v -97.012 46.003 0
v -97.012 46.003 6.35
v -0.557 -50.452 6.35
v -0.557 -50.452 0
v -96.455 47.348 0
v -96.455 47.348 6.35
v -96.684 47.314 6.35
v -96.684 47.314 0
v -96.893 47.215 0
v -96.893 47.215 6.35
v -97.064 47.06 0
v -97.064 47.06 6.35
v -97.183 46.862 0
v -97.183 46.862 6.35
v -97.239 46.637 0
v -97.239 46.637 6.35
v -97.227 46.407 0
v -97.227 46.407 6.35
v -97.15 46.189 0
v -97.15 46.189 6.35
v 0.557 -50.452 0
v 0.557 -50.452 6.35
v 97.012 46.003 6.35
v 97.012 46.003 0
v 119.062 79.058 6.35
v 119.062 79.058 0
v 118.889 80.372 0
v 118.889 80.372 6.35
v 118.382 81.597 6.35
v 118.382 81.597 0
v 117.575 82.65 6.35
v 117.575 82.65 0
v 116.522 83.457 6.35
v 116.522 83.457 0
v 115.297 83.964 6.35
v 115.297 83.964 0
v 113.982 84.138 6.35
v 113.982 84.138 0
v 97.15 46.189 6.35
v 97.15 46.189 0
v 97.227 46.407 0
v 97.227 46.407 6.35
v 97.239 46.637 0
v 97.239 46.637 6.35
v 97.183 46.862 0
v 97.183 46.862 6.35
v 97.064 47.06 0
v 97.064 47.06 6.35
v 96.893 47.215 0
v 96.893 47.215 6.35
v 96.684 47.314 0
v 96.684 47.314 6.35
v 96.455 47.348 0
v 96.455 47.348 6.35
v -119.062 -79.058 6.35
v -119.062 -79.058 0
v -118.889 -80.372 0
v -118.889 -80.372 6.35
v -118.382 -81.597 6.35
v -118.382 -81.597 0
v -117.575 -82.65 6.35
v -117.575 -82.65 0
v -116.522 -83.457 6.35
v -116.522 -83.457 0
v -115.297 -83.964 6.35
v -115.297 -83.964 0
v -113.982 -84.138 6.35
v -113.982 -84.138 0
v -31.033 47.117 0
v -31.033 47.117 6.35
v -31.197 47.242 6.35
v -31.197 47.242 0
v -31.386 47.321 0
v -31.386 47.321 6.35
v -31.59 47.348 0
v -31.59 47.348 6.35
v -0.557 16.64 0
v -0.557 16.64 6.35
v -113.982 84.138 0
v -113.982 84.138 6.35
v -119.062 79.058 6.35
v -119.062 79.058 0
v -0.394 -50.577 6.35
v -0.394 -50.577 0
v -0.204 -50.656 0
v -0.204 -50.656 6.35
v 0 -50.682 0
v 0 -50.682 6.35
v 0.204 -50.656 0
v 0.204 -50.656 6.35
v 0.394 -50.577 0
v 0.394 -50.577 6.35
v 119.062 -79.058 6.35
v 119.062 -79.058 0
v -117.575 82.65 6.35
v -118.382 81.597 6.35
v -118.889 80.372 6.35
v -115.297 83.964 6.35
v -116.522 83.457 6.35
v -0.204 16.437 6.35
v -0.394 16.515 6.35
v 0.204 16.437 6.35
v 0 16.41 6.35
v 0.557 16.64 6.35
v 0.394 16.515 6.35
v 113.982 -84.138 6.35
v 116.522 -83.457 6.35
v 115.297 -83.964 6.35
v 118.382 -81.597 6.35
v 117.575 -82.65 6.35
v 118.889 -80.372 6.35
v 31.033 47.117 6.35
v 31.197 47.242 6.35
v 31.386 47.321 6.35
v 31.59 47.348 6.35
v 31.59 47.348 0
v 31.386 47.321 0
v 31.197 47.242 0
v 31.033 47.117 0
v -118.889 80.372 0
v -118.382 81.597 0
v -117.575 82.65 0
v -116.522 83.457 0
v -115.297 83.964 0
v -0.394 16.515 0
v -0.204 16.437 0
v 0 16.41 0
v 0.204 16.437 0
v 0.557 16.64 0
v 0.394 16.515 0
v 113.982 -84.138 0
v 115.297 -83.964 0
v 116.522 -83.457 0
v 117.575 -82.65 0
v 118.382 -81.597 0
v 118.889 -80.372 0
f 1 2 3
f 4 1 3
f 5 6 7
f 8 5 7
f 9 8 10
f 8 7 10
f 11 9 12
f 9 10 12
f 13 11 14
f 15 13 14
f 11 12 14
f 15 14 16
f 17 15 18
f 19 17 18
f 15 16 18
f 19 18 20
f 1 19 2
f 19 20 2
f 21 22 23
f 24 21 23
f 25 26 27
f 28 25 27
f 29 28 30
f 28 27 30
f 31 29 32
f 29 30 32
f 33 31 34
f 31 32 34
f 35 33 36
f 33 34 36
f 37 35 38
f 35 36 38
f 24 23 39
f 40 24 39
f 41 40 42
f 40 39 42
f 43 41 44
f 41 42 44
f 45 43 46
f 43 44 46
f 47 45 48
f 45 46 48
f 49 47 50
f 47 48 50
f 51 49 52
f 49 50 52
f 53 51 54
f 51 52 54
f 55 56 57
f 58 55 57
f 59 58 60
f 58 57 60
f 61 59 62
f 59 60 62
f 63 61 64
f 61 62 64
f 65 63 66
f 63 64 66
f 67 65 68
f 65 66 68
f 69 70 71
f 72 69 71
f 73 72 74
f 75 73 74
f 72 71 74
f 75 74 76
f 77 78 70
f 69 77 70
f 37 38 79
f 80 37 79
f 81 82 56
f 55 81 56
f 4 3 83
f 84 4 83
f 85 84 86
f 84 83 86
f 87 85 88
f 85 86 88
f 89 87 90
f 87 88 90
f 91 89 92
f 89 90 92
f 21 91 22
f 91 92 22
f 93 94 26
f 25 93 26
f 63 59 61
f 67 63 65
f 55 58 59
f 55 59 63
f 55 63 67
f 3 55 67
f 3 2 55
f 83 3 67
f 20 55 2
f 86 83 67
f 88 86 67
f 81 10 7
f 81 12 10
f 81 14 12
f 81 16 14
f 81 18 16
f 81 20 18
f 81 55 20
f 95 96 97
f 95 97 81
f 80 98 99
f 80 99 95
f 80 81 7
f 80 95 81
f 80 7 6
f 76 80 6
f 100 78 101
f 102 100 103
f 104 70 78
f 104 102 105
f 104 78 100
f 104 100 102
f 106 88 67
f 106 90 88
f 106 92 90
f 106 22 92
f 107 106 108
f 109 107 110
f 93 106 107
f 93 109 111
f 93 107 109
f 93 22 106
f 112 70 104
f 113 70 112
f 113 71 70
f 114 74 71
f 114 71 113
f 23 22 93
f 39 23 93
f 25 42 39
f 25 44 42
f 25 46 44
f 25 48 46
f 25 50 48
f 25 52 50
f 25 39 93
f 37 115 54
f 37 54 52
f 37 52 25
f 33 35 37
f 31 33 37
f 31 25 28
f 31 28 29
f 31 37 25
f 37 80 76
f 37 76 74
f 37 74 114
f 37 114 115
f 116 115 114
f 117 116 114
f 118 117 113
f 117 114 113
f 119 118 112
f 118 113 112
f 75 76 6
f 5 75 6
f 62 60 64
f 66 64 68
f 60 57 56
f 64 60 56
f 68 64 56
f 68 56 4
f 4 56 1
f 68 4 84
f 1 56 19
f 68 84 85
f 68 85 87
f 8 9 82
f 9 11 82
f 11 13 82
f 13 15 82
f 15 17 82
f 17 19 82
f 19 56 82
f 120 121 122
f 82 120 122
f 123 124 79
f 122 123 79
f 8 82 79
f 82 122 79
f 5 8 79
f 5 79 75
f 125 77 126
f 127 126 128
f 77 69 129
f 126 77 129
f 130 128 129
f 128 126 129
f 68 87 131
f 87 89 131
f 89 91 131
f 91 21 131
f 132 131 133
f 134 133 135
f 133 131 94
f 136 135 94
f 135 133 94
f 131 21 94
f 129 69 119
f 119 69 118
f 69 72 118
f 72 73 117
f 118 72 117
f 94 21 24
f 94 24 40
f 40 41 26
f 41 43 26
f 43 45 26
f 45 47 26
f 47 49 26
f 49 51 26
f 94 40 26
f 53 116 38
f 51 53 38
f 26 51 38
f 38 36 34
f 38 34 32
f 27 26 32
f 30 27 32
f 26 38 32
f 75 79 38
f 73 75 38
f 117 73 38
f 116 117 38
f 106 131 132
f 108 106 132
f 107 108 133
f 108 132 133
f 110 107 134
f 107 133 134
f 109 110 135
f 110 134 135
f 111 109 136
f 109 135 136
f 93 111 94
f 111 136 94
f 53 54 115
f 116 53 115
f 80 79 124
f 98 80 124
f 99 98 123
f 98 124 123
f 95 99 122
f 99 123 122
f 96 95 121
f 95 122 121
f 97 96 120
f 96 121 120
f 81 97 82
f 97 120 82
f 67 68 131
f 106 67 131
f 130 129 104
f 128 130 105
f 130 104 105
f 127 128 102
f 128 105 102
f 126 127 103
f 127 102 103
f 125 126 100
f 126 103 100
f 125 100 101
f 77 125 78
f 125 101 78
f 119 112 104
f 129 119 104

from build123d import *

# Parameters (mm, degrees)
F1_DEPTH = 6.35
F3_DEPTH = 6.351
F5_DEPTH = 6.351


with BuildPart() as f1:
    # F0 (on Top) → F1 (new body)
    with BuildSketch(Plane.XY):
        with BuildLine():
            Line((113.9825, 84.1375), (-113.9825, 84.1375))
            ThreePointArc((-113.9825, 84.1375), (-117.574602, 82.649602), (-119.0625, 79.0575))
            Line((-119.0625, 79.0575), (-119.0625, -79.0575))
            ThreePointArc((-119.0625, -79.0575), (-117.574602, -82.649602), (-113.9825, -84.1375))
            Line((-113.9825, -84.1375), (113.9825, -84.1375))
            ThreePointArc((113.9825, -84.1375), (117.574602, -82.649602), (119.0625, -79.0575))
            Line((119.0625, -79.0575), (119.0625, 79.0575))
            ThreePointArc((119.0625, 79.0575), (117.574602, 82.649602), (113.9825, 84.1375))
        make_face()
    extrude(amount=F1_DEPTH)

    # F2 (on face) → F3 (cut, through all)
    with BuildSketch(Plane.XY.offset(6.35)):
        Polygon((-95.290107, 46.077607), (0, -49.2125), (95.290107, 46.077607), (31.790107, 46.077607), (0, 14.2875), (-31.790107, 46.077607), align=None)
    extrude(amount=-F3_DEPTH, mode=Mode.SUBTRACT)

    # F4 (on face) → F5 (cut, through all)
    with BuildSketch(Plane.XY.offset(6.35)):
        with BuildLine():
            Line((-97.011982, 46.003431), (-0.556776, -50.451775))
            ThreePointArc((-0.556776, -50.451775), (0, -50.682399), (0.556776, -50.451775))
            Line((0.556776, -50.451775), (97.011982, 46.003431))
            ThreePointArc((97.011982, 46.003431), (97.182669, 46.861532), (96.455206, 47.347607))
            Line((96.455206, 47.347607), (31.590207, 47.347607))
            ThreePointArc((31.590207, 47.347607), (31.288882, 47.287669), (31.033431, 47.116983))
            Line((31.033431, 47.116983), (0.556776, 16.640327))
            ThreePointArc((0.556776, 16.640327), (0, 16.409703), (-0.556776, 16.640327))
            Line((-0.556776, 16.640327), (-31.033431, 47.116983))
            ThreePointArc((-31.033431, 47.116983), (-31.288882, 47.287669), (-31.590207, 47.347607))
            Line((-31.590207, 47.347607), (-96.455206, 47.347607))
            ThreePointArc((-96.455206, 47.347607), (-97.182669, 46.861532), (-97.011982, 46.003431))
        make_face()
    extrude(amount=-F5_DEPTH, mode=Mode.SUBTRACT)


solid = f1.part
